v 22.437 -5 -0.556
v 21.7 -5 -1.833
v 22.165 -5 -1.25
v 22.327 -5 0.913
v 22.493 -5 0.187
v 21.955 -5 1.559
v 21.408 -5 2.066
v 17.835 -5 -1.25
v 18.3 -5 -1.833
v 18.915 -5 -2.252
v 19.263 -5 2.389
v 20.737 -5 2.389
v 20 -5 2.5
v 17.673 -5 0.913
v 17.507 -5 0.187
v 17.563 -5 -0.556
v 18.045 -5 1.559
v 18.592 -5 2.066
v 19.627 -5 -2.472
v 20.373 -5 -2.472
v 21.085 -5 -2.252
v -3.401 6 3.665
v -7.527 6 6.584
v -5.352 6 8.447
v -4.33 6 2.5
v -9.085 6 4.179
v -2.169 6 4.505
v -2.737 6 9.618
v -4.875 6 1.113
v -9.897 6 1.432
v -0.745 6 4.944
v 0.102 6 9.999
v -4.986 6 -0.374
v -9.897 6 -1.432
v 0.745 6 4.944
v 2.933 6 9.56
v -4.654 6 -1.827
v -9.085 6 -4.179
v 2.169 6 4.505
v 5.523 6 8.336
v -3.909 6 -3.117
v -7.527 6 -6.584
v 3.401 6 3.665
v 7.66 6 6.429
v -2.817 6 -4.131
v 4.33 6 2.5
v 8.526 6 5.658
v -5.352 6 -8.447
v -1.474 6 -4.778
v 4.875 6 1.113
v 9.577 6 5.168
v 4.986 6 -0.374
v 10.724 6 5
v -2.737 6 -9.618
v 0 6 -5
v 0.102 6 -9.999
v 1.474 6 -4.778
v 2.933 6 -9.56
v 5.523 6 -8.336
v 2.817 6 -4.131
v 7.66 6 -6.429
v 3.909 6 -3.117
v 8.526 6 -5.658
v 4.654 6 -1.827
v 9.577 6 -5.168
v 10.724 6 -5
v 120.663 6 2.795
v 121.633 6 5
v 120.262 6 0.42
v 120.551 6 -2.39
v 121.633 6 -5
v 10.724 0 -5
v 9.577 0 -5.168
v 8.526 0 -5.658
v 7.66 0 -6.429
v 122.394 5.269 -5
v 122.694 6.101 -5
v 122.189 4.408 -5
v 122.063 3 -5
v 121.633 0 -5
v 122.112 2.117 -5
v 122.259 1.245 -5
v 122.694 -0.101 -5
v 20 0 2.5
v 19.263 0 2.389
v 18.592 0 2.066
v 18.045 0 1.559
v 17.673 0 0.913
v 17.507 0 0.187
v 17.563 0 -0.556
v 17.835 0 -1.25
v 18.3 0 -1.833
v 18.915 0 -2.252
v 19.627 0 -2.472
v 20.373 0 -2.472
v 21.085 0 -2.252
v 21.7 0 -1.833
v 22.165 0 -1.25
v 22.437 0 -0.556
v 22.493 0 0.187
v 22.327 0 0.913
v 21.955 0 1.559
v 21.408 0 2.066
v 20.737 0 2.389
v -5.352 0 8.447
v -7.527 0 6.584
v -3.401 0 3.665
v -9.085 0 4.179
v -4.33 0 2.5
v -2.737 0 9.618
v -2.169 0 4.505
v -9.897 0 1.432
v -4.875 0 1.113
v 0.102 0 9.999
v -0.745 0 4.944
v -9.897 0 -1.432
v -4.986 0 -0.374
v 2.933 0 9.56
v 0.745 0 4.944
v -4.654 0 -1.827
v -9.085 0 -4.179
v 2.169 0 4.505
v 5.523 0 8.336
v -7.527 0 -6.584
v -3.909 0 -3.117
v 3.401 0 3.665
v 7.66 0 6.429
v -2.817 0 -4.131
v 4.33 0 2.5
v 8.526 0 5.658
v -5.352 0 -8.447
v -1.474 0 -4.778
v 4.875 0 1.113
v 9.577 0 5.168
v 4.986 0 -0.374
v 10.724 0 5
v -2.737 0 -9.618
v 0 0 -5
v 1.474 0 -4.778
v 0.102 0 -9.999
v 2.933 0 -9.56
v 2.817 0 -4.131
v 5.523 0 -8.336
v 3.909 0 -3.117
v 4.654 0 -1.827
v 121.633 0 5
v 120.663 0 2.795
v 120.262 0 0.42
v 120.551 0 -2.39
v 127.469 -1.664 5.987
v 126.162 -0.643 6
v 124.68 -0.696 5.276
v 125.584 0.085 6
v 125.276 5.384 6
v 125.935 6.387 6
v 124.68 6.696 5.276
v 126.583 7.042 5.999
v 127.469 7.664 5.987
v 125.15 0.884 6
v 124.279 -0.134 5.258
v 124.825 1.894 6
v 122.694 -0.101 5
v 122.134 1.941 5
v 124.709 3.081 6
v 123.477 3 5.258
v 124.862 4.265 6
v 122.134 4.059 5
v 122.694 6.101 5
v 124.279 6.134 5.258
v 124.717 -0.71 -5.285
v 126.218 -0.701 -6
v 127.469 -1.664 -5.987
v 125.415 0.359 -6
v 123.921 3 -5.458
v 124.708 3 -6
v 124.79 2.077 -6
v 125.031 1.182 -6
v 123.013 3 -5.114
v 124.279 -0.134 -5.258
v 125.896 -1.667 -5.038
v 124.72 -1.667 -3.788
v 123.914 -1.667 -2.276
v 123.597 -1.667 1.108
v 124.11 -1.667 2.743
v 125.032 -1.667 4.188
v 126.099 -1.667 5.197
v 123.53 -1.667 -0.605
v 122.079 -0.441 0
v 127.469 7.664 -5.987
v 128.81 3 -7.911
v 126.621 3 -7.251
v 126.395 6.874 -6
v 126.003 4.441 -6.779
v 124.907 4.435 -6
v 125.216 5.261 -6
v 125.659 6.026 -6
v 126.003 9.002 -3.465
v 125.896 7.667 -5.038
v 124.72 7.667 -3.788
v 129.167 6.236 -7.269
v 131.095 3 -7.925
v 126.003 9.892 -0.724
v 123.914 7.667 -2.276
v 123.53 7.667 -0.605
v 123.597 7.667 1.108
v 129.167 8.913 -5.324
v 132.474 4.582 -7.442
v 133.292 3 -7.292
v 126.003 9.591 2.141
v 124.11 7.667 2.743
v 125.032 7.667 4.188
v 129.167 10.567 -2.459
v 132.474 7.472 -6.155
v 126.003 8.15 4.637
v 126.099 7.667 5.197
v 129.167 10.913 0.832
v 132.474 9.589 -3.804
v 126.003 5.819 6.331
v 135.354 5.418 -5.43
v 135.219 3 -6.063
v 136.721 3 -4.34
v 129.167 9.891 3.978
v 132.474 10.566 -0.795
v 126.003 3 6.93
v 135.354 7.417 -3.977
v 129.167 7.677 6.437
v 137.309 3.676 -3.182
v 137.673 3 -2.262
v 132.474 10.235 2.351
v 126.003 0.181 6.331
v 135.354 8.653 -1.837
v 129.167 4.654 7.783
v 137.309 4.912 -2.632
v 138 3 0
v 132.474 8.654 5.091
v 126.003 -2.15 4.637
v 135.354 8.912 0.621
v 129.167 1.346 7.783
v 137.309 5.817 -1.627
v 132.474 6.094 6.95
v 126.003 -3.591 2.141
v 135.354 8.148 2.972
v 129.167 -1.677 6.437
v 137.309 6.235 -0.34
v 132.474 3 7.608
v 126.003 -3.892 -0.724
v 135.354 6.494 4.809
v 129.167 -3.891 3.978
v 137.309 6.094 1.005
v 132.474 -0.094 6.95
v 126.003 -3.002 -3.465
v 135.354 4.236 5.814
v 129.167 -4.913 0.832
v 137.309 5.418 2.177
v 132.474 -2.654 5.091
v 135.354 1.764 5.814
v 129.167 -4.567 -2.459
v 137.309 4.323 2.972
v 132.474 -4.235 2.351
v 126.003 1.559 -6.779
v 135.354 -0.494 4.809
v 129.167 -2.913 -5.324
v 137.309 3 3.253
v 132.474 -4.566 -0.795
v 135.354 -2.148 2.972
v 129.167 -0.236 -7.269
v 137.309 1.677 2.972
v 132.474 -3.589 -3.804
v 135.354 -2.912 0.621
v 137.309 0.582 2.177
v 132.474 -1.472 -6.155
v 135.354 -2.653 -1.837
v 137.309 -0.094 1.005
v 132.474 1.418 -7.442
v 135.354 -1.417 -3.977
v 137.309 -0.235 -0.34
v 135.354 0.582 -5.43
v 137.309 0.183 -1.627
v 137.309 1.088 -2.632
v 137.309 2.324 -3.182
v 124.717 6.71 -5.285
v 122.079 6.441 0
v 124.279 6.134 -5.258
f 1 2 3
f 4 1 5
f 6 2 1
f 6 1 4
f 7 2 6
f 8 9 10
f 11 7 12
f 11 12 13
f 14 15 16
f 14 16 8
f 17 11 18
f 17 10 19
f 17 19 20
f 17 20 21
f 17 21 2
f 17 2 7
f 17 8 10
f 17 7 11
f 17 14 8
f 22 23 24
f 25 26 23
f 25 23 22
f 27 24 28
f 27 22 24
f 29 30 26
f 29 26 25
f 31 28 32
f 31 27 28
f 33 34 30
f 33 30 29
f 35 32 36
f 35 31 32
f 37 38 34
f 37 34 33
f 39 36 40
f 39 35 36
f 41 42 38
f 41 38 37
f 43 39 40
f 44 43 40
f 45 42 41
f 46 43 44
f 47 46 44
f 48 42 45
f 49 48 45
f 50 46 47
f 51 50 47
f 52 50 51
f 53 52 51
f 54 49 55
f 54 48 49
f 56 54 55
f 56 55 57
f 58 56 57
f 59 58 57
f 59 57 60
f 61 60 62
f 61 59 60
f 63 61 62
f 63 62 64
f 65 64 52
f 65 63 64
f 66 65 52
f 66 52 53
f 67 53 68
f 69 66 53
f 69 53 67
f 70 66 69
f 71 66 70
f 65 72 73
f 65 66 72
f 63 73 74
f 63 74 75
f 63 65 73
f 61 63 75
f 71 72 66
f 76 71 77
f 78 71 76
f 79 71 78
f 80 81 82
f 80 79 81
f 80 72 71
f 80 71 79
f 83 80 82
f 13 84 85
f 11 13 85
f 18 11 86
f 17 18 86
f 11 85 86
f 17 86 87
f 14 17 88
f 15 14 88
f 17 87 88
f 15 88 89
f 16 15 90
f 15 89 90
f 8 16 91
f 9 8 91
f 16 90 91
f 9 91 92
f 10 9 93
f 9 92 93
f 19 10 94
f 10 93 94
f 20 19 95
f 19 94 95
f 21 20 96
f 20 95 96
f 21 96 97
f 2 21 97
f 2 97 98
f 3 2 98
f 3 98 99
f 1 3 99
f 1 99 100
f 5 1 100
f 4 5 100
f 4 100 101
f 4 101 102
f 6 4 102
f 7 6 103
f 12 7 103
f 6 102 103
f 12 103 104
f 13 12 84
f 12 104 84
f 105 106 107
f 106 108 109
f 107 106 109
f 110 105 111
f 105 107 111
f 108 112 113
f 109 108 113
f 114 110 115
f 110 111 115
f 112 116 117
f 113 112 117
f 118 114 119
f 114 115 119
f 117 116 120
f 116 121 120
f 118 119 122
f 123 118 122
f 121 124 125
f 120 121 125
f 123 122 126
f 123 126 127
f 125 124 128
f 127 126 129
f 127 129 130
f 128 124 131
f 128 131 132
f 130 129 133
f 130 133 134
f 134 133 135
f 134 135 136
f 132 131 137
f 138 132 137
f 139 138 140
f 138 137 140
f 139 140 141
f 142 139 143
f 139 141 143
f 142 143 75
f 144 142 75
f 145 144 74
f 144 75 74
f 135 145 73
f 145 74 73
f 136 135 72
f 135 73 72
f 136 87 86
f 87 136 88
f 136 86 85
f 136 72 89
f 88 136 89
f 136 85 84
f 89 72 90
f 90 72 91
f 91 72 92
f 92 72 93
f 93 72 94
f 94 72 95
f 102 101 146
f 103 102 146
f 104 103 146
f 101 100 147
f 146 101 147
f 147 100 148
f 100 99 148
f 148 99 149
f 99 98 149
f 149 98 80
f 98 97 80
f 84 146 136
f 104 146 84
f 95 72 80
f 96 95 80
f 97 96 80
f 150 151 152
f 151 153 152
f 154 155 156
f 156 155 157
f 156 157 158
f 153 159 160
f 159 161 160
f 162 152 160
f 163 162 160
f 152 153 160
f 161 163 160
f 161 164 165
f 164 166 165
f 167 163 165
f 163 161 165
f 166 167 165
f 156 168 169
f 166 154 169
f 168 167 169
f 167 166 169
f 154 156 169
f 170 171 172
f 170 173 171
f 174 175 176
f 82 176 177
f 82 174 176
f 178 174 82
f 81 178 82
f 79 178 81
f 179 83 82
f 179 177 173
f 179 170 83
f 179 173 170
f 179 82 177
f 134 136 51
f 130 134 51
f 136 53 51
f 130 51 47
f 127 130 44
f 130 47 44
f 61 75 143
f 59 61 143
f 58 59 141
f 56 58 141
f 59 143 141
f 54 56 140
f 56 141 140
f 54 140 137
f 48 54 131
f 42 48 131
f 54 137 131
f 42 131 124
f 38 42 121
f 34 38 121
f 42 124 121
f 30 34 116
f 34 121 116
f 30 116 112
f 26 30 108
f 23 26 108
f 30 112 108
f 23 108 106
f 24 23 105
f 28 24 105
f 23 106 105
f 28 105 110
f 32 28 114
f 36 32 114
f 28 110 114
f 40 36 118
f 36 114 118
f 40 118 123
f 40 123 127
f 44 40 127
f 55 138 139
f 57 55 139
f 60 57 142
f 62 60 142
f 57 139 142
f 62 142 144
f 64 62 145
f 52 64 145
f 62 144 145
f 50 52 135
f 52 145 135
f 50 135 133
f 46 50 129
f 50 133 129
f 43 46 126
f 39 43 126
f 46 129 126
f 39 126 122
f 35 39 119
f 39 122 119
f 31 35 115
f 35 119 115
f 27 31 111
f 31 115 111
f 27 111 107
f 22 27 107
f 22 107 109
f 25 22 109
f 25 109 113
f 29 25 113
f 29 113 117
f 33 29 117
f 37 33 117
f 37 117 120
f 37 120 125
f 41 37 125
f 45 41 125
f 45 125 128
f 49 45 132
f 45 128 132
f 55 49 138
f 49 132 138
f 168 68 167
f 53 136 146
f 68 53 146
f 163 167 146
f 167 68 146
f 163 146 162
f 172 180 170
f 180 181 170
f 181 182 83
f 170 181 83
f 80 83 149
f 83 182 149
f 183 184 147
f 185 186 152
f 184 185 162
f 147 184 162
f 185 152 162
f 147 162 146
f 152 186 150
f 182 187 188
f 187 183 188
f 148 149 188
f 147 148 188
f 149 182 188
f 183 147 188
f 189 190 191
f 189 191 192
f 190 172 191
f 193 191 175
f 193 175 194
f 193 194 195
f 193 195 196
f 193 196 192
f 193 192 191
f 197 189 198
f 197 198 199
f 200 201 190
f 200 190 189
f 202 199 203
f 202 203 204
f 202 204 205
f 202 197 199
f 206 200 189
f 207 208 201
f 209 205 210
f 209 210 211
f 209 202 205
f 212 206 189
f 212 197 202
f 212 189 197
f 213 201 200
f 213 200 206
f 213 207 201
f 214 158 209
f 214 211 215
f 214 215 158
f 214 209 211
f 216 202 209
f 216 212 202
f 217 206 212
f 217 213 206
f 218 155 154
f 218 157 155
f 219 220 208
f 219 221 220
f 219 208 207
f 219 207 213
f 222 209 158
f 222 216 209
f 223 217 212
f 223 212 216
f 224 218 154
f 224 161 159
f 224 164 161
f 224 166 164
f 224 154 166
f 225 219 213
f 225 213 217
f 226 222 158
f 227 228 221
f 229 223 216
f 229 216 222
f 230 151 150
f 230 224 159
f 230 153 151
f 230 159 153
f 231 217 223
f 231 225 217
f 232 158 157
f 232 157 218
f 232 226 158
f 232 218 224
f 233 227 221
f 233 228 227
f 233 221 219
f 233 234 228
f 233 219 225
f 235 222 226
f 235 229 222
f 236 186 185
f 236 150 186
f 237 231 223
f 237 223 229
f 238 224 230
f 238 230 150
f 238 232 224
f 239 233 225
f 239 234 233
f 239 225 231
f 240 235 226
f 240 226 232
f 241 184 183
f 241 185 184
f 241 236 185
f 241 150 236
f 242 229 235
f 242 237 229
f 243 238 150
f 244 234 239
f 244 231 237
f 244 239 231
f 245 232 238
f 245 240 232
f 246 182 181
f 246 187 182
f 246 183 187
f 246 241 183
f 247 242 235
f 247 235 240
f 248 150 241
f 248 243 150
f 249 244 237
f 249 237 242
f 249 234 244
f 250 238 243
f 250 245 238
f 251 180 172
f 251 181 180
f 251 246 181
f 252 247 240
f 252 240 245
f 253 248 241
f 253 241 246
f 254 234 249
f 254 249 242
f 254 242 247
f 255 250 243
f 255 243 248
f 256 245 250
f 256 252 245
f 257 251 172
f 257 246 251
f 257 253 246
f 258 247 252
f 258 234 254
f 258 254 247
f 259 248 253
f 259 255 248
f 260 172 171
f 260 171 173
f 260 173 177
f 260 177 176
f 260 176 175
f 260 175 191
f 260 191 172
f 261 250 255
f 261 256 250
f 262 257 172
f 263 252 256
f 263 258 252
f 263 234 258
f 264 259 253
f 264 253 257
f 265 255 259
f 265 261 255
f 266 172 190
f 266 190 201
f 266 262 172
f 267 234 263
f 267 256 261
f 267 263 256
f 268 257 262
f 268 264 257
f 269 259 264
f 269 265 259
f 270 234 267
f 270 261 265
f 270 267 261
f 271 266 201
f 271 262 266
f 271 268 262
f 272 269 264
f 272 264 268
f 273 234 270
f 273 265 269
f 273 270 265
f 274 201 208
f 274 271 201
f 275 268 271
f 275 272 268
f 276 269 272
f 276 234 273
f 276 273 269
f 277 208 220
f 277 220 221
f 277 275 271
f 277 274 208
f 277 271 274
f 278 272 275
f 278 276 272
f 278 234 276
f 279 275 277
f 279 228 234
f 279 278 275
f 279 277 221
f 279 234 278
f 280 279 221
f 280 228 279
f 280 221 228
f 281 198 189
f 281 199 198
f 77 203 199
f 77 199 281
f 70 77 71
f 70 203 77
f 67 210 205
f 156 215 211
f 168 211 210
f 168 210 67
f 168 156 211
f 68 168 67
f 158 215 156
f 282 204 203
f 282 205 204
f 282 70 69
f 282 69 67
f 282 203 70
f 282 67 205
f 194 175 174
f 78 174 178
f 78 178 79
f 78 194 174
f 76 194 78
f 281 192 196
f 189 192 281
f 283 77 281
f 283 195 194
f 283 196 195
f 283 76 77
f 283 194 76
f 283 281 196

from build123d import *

# Parameters (mm, degrees)
SKETCH_1_R          = 10
SKETCH_1_R_2        = 4.99999999999999
SKETCH_1_W          = 121.3397459621556
SKETCH_1_H          = 9.99999999999998
EXTRUDE_1_DEPTH     = 6
FILLET_1_R          = 4
SKETCH_3_R          = 5
CUT_EXTRUDE_1_DEPTH = 6
SKETCH_4_R          = 2.4999999999999982
EXTRUDE_2_DEPTH     = 5


with BuildPart() as part:
    # 草图1 → 凸台-拉伸1 (new body)
    with BuildSketch(Plane(origin=(0, 0, 0), x_dir=(1, 0, 0), z_dir=(0, 1, 0))):
        Circle(SKETCH_1_R)
        with Locations((130, 0)):
            Circle(SKETCH_1_R_2)
        with Locations((69.3301270189222, 0)):
            Rectangle(SKETCH_1_W, SKETCH_1_H)
    extrude(amount=EXTRUDE_1_DEPTH)

    # 草图2 → 旋转6 (revolve)
    with BuildSketch(Plane(origin=(0, 3, 0), x_dir=(1, 0, 0), z_dir=(0, 1, 0)), mode=Mode.PRIVATE) as revolve_6_sk:
        with BuildLine():
            ThreePointArc((130, -4.999999999999993), (133.53553390593277, -3.5355339059327036), (135, 8.296e-14))
            Line((135, 0), (130, 0))
            Line((130, 0), (122, 0))
            ThreePointArc((121.99999999999999, 9.8e-16), (122.45149074362405, -2.6495297708096603), (123.75500200160165, -5.0000000000000915))
            Line((123.7550020016017, -4.99999999999999), (130, -4.99999999999999))
        make_face()
        with BuildLine():
            ThreePointArc((123.75500200160165, -5.0000000000000915), (132.64952977080966, -7.548509256375958), (138, -1.96e-15))
            Line((138, 0), (135, 0))
            ThreePointArc((135, 8.296e-14), (133.53553390593277, -3.5355339059327036), (130, -4.999999999999993))
            Line((130, -4.99999999999999), (123.7550020016017, -4.99999999999999))
        make_face()
        with BuildLine():
            ThreePointArc((130, -4.999999999999993), (133.53553390593277, -3.5355339059327036), (135, 8.296e-14))
            Line((135, 0), (130, 0))
            Line((130, 0), (122, 0))
            ThreePointArc((121.99999999999999, 9.8e-16), (122.45149074362405, -2.6495297708096603), (123.75500200160165, -5.0000000000000915))
            Line((123.7550020016017, -4.99999999999999), (130, -4.99999999999999))
        make_face()
    revolve(revolve_6_sk.sketch.rotate(Axis((130, 3, 0), (1, 0, 0)), 180), axis=Axis((130, 3, 0), (1, 0, 0)))

    # 圆角1
    fillet_1_edges = [part.edges().sort_by_distance(p)[0] for p in [
        (123.7550020016015, 3.0000000000000013, 4.99999999999999),
        (122.58380151290432, 6, 7.053e-14),
        (123.94998914244879, 4.548343832458719, -4.99999999999999),
        (122.58380151290432, 0, 6.78e-14),
        (8.66025403784439, 3, -4.99999999999999),
        (8.66025403784439, 3, 4.99999999999999),
    ]]
    fillet(fillet_1_edges, radius=FILLET_1_R)

    # 草图3 → 切除-拉伸1 (cut)
    with BuildSketch(Plane.XZ):
        with Locations(Location((0, 0, 0), (0, 0, 270))):
            Circle(SKETCH_3_R)
    extrude(amount=-CUT_EXTRUDE_1_DEPTH, mode=Mode.SUBTRACT)

    # 草图4 → 凸台-拉伸2 (add)
    with BuildSketch(Plane.XZ):
        with Locations(Location((20, 0, 0), (0, 0, 90))):
            Circle(SKETCH_4_R)
    extrude(amount=EXTRUDE_2_DEPTH)


solid = part.part
